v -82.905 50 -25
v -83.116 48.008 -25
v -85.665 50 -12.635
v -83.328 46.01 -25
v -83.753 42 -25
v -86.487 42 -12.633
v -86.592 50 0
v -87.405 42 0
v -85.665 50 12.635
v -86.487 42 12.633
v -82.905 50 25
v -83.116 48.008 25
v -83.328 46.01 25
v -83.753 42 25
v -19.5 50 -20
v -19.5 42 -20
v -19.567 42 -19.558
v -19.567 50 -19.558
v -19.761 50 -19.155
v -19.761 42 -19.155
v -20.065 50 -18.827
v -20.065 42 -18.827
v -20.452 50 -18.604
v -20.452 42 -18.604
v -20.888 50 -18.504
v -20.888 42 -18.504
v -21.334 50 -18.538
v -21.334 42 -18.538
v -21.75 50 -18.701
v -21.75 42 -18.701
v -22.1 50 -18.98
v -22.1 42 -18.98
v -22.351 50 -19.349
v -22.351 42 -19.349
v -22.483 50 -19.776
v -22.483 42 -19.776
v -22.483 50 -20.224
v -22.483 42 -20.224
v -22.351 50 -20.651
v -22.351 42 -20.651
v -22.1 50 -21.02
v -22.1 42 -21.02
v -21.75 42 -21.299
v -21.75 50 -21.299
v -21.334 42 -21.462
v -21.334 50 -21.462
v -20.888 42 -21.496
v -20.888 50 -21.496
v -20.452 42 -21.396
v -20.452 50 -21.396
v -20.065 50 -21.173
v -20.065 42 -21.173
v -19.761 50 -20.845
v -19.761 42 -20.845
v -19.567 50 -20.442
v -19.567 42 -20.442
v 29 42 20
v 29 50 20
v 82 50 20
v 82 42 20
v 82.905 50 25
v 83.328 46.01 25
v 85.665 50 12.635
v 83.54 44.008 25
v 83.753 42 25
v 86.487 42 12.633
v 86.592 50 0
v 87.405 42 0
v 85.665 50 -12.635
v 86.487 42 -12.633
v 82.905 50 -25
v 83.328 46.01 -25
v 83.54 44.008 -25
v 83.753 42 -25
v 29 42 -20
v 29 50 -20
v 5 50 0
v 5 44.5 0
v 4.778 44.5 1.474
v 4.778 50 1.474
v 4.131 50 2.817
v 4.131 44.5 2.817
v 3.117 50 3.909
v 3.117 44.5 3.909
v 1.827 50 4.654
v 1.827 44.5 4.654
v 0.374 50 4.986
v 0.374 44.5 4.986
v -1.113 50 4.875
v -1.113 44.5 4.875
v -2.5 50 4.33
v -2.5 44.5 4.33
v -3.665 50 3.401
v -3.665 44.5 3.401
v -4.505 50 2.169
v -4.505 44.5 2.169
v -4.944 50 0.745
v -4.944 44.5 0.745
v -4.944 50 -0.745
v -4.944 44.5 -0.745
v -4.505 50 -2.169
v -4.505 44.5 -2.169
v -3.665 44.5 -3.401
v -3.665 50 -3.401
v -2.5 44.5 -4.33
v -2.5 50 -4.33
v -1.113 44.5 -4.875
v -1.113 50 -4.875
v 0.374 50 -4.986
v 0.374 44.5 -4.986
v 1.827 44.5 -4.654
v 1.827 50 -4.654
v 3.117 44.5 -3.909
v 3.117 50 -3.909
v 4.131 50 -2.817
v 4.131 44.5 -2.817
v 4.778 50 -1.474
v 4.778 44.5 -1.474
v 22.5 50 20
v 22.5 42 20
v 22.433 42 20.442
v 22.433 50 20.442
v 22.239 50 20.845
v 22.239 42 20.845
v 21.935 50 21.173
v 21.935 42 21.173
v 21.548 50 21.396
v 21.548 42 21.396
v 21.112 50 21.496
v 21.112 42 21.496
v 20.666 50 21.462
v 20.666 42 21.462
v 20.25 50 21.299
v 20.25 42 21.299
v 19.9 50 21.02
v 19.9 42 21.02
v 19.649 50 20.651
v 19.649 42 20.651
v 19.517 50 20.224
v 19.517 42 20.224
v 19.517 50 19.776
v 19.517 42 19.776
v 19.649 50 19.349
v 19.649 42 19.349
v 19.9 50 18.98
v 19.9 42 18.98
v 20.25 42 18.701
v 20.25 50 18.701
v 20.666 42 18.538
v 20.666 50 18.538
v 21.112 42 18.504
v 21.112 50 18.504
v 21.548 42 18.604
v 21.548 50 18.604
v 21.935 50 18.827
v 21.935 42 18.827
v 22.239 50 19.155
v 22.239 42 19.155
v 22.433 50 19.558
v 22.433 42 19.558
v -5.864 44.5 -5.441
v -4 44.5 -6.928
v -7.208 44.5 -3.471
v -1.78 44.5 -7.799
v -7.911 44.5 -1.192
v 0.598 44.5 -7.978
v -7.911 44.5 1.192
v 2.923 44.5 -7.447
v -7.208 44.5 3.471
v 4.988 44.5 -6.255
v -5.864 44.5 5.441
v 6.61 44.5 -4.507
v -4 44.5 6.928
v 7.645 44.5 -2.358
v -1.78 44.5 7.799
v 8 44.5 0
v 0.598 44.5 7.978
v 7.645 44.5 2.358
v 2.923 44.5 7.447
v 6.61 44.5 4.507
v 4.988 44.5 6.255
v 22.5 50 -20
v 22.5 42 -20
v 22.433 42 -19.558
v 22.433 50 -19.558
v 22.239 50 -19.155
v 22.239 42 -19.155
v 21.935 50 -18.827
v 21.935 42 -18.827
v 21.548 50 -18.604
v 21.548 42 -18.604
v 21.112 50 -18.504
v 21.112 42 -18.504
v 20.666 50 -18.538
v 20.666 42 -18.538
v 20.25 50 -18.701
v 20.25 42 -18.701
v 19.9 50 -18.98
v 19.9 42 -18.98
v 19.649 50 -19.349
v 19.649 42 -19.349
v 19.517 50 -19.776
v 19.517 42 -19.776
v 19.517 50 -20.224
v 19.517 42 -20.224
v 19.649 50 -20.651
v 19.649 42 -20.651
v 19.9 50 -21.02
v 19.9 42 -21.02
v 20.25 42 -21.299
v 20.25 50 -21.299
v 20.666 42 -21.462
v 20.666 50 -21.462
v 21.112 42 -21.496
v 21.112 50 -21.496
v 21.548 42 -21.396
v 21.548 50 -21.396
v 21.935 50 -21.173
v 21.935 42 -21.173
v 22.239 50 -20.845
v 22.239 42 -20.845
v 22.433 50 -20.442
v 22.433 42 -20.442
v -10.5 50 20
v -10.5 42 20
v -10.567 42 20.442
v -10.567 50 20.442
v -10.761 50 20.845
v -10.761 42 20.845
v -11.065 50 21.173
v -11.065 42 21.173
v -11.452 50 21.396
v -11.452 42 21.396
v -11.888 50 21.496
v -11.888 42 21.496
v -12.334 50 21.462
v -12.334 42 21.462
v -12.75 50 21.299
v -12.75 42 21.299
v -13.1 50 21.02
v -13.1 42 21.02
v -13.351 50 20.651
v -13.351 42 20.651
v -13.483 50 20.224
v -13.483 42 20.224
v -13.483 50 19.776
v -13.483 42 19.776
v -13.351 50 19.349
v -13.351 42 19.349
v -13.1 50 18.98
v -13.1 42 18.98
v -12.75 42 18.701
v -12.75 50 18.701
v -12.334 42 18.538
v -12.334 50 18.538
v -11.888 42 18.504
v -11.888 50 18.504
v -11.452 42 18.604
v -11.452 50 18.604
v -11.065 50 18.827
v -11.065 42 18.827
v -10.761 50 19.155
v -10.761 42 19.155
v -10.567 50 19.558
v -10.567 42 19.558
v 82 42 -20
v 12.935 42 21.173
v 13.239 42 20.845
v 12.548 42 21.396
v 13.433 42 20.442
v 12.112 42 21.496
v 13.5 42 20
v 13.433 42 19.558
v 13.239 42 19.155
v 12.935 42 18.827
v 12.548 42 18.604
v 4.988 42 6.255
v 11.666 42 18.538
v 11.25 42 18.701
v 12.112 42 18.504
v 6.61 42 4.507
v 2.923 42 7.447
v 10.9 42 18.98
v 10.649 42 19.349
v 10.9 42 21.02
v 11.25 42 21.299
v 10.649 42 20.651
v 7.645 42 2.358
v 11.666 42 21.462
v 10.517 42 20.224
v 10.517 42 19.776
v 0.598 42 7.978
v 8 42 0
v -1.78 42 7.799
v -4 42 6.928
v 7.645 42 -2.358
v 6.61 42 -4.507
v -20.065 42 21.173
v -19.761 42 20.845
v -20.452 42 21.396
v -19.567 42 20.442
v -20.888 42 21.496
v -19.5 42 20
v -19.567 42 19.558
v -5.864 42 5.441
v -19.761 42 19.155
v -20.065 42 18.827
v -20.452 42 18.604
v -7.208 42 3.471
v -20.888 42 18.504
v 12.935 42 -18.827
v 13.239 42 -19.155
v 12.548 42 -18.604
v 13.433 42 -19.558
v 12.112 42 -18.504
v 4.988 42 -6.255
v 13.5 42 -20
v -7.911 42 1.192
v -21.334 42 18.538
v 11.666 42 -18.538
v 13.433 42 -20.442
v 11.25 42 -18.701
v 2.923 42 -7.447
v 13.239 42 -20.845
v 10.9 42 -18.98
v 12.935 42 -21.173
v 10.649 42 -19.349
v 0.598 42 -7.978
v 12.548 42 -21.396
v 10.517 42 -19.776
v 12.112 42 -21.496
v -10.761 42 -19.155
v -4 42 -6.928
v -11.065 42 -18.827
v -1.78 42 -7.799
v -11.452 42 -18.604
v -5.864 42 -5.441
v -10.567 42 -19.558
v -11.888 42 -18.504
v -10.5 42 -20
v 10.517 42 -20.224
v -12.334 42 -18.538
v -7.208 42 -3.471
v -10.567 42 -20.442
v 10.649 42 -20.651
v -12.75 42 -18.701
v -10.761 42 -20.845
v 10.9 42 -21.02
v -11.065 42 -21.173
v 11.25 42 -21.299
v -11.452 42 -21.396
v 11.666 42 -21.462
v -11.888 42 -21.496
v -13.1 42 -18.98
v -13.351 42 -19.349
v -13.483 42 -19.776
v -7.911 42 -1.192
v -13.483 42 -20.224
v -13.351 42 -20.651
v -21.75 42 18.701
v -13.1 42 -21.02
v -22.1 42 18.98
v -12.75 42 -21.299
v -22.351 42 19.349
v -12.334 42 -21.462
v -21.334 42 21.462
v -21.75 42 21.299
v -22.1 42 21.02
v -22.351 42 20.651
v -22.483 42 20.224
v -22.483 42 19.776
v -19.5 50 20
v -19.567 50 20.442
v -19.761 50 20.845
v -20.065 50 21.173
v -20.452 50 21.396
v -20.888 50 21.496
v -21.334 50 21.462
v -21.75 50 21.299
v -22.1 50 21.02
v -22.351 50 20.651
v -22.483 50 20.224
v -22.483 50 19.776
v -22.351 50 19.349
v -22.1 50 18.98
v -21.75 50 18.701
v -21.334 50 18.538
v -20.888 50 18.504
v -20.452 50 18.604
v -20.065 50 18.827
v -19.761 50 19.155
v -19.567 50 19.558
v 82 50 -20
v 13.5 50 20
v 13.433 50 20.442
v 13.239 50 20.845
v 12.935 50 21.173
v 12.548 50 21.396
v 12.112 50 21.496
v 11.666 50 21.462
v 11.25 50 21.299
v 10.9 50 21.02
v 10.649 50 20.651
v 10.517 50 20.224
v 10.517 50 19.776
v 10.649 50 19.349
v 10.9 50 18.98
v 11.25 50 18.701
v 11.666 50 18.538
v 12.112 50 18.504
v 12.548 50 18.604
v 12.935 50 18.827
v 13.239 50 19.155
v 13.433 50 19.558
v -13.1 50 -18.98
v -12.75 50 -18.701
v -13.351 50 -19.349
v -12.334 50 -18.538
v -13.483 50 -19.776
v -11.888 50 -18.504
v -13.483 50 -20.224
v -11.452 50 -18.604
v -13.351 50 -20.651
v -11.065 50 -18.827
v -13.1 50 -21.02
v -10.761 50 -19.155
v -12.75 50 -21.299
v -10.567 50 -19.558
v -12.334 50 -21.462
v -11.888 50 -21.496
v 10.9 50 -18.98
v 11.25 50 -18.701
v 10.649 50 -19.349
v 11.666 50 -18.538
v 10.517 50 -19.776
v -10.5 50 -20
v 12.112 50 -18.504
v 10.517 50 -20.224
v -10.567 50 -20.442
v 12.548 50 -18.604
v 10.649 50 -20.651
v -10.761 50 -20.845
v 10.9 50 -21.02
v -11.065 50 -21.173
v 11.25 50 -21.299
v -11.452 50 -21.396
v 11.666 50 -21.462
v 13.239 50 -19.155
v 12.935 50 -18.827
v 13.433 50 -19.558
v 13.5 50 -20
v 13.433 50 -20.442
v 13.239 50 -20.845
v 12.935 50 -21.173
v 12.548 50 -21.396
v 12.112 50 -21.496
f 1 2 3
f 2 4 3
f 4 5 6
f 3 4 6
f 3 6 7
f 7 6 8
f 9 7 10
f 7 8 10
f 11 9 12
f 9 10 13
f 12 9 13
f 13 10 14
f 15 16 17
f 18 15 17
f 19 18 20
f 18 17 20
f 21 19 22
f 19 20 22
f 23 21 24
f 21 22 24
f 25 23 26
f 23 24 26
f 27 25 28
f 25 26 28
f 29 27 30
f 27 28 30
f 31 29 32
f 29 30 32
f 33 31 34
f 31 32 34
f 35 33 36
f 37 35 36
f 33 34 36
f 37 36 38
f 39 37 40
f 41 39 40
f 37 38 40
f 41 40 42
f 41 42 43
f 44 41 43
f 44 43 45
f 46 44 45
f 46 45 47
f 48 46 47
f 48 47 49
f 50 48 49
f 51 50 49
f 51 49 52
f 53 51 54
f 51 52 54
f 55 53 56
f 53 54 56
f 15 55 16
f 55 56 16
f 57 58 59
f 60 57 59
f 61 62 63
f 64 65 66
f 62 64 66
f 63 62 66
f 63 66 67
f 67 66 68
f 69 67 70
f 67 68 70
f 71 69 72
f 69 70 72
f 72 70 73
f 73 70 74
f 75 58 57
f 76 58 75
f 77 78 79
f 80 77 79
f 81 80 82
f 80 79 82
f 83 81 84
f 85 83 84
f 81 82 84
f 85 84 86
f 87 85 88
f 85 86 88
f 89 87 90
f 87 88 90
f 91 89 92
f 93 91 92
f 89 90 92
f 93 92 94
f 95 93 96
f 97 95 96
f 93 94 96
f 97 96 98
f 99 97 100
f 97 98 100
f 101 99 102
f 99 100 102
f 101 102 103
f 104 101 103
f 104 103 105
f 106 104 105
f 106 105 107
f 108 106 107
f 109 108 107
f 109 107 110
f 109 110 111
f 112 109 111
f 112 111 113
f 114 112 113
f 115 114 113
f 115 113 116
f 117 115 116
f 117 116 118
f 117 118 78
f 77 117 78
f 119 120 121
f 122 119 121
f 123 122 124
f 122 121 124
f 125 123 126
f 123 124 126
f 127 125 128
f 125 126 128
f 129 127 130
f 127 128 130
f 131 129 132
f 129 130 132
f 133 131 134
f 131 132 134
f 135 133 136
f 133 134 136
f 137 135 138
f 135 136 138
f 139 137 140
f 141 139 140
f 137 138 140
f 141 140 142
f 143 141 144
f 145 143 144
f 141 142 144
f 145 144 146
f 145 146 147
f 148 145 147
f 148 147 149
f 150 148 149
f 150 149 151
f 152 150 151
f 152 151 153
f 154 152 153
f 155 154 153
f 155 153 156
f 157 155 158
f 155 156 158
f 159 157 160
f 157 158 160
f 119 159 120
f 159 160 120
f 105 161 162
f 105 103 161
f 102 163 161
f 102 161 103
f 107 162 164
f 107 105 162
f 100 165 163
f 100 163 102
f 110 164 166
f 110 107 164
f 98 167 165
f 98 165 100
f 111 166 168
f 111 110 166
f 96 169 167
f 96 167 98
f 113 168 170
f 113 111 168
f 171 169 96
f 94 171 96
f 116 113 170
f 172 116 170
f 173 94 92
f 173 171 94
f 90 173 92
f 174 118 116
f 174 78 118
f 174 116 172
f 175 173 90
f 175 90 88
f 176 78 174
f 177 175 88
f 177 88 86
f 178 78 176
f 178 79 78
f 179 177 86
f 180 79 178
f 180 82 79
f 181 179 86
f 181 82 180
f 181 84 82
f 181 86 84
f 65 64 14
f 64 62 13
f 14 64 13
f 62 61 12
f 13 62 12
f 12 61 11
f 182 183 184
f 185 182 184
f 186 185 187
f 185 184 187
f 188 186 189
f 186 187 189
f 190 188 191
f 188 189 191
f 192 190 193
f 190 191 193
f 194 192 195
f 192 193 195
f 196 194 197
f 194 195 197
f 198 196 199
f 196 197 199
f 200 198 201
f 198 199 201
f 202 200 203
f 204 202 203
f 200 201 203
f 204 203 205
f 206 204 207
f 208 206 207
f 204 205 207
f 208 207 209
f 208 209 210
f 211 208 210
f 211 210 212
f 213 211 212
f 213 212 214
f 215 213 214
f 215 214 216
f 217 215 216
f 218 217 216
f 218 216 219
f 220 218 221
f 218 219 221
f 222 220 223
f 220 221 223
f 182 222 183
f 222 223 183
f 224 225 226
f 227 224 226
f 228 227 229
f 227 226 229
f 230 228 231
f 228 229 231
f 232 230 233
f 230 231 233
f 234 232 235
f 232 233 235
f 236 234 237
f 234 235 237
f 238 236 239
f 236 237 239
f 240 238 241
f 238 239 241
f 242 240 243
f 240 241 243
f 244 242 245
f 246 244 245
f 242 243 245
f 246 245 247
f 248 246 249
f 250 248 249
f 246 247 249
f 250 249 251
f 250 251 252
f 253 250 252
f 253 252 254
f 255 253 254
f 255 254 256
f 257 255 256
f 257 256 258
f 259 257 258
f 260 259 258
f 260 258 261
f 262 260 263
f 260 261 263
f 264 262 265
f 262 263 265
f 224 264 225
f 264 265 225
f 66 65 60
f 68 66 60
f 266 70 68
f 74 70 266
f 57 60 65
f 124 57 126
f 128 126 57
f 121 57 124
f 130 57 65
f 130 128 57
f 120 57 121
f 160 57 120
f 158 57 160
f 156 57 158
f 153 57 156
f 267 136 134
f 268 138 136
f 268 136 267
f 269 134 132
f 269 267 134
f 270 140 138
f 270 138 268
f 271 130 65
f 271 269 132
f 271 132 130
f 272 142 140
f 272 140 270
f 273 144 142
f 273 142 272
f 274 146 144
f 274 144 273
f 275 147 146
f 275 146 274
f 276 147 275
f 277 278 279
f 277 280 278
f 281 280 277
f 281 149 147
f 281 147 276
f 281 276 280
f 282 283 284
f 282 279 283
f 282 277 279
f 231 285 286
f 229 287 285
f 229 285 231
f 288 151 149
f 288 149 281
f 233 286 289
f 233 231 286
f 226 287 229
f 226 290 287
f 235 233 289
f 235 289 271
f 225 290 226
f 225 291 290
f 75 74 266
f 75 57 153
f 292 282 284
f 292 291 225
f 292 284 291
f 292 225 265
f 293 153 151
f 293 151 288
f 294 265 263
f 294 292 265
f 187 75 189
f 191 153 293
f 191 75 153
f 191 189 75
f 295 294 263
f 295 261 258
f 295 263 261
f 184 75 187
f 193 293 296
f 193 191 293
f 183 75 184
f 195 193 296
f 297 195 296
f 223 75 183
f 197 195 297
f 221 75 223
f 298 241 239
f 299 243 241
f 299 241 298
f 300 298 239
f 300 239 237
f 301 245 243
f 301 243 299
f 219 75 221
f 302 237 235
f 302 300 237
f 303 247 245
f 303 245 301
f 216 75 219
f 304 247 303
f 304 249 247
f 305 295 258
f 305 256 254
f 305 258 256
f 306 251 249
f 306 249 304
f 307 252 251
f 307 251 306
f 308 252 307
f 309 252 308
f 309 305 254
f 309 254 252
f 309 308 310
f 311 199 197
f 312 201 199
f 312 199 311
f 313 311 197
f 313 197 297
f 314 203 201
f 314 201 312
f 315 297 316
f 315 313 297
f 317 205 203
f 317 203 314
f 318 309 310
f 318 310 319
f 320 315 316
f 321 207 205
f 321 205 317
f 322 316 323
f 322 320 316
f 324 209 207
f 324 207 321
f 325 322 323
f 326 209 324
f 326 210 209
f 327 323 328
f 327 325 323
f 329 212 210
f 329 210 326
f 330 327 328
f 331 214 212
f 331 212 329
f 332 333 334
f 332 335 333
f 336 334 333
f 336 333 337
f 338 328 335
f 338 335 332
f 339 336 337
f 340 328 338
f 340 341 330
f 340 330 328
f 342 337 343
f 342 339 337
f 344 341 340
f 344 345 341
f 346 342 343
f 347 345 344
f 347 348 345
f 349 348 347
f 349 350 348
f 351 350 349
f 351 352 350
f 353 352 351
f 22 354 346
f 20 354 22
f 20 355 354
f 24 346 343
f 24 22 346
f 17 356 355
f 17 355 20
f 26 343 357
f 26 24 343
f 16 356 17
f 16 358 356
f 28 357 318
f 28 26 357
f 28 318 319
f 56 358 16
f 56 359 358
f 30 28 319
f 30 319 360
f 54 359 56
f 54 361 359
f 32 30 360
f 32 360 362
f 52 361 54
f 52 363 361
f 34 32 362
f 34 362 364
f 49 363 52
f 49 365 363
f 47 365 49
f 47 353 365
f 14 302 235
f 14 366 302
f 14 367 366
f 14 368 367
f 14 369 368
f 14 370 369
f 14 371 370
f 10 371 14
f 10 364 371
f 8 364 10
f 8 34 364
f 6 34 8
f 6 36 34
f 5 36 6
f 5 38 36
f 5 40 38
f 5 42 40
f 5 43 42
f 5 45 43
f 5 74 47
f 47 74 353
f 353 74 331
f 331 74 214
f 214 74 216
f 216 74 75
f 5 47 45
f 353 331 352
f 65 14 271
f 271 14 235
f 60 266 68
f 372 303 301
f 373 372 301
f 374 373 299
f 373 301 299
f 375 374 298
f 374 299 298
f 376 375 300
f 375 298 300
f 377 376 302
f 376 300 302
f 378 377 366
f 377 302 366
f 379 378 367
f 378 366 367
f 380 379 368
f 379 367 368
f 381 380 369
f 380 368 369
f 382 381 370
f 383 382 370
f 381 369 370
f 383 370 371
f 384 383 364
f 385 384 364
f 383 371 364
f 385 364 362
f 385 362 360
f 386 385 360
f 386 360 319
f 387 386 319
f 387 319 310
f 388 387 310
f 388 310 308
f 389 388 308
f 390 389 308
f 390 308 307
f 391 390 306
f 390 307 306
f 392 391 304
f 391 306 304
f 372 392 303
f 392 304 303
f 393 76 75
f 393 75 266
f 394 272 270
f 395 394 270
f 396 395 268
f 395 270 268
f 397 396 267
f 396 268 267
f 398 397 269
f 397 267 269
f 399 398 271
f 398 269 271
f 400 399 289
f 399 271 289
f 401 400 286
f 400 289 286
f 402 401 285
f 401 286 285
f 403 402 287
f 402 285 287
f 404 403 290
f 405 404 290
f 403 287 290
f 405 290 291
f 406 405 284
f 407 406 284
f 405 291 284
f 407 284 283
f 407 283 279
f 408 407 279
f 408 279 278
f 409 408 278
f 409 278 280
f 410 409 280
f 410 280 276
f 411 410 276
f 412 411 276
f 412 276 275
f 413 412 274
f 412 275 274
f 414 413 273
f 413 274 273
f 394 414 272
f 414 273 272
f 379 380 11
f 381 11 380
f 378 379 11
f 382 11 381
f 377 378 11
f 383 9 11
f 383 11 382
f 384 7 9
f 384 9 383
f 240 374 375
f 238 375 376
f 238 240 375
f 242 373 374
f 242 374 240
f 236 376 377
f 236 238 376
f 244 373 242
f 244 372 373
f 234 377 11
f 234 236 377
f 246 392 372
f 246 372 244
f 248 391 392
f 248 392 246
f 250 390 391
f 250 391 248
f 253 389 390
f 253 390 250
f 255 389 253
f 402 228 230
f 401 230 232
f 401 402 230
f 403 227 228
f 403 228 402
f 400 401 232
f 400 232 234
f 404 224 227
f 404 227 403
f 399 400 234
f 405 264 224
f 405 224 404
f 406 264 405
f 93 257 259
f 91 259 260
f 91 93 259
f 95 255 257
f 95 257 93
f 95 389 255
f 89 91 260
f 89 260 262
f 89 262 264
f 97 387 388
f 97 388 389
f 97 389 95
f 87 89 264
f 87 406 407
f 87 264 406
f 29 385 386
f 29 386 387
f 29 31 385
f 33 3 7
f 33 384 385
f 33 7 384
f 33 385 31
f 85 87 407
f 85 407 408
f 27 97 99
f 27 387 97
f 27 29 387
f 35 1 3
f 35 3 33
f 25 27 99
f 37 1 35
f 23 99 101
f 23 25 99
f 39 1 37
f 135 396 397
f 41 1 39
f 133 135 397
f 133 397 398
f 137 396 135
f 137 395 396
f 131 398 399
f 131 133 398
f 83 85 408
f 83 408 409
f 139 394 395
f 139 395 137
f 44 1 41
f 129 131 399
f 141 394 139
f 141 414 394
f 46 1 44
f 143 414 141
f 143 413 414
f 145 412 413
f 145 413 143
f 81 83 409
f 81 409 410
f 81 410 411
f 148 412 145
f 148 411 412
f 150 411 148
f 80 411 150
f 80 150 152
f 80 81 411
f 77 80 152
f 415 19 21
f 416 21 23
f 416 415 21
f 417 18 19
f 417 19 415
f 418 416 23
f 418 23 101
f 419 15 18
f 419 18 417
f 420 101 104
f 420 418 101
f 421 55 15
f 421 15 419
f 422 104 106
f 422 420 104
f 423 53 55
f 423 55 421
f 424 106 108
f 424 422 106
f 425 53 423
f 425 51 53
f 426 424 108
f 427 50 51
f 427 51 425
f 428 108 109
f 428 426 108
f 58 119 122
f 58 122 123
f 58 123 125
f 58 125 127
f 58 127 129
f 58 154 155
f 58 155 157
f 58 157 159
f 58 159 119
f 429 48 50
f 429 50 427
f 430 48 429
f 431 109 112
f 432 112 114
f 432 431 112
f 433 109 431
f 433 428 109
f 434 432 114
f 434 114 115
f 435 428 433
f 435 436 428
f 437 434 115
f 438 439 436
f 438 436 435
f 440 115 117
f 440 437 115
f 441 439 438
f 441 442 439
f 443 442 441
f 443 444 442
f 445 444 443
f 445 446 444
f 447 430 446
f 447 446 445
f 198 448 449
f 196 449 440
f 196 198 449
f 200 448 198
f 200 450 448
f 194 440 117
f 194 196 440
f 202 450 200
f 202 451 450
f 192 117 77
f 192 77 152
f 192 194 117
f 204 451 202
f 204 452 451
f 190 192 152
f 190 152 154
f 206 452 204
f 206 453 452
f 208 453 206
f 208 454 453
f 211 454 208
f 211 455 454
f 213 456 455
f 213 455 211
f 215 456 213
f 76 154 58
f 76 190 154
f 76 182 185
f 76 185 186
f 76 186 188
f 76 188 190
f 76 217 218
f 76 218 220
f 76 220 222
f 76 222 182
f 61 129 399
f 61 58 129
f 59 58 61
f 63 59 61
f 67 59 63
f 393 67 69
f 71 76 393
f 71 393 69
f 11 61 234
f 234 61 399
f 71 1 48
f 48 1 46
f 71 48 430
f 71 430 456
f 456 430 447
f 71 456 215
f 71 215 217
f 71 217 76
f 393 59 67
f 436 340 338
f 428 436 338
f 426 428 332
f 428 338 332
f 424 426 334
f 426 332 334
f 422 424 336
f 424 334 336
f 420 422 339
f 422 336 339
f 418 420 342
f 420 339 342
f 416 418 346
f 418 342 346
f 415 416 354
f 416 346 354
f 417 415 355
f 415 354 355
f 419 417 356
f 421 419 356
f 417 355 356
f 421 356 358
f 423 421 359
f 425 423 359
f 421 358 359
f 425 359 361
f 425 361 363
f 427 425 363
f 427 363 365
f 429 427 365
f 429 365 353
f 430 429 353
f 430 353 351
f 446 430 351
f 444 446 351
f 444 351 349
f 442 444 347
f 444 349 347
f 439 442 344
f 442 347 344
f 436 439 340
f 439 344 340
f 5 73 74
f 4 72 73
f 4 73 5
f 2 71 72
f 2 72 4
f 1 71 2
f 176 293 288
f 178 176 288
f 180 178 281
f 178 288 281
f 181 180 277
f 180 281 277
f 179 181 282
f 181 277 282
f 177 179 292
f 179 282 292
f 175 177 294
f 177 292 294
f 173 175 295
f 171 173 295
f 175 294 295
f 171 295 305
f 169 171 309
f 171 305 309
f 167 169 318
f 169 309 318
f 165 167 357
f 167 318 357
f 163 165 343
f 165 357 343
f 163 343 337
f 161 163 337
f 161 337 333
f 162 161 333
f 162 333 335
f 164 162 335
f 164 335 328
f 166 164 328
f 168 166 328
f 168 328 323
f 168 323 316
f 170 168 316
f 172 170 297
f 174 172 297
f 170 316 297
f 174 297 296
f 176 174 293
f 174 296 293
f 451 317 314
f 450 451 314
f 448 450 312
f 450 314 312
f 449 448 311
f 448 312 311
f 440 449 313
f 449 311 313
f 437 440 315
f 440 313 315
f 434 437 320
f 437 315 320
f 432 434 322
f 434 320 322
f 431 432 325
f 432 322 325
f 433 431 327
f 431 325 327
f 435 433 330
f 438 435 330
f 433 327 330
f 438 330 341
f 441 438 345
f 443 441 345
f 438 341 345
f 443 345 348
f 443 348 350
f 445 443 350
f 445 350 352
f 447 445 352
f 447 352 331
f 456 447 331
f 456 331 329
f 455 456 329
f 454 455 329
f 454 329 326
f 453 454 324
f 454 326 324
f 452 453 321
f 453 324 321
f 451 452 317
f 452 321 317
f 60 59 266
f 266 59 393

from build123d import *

# Parameters (mm, degrees)
TOP_PLATE_BOSS_EXTRUDE1_DEPTH                  = 25
TOP_PLATE_BOSS_EXTRUDE1_DEPTH_BACK             = 25
SKETCH5_R                                      = 5
SHAFT_CUT_EXTRUDE1_DEPTH                       = 8
SKETCH6_R                                      = 8
SHAFT_BEARING_CUT_EXTRUDE2_DEPTH               = 2.5
SKETCH7_R                                      = 1.5
BEARING_PLATE_MOUNTING_HOLES_CUT_EXTRUDE_DEPTH = 8
SKETCH8_R                                      = 1.5
BASE_SIDE_MOUNTING_HOLES_CUT_EXTRUDE4_DEPTH    = 8
SKETCH9_W                                      = 53
SKETCH9_H                                      = 40
TIMING_BELT_SLIDER_HOLE_CUT_EXTRUDE1_DEPTH     = 8


with BuildPart() as part:
    # Sketch2 → Top Plate Boss-Extrude1 (new, two sides: drawn at the far end of the back side and taken through both)
    with BuildSketch(Plane.XY.offset(-TOP_PLATE_BOSS_EXTRUDE1_DEPTH_BACK)):
        Polygon((-86.592068141, 50), (86.592068141, 50), (87.404678508, 42), (-87.404678508, 42), align=None)
    extrude(amount=TOP_PLATE_BOSS_EXTRUDE1_DEPTH + TOP_PLATE_BOSS_EXTRUDE1_DEPTH_BACK)

    # Sketch4 → Top Plate Chassi Rounding Cut-Revolve1 (revolve, cut)
    with BuildSketch(Plane.XY):
        Polygon((86.592068141, 50), (87.404678508, 42), (97.784973569, 42), (97.784973569, 50), align=None)
    revolve(axis=Axis((0, 0, 0), (0, 1, 0)), mode=Mode.SUBTRACT)

    # Sketch5 → Shaft Cut-Extrude1 (cut)
    with BuildSketch(Plane.XZ.offset(-42)):
        Circle(SKETCH5_R)
    extrude(amount=-SHAFT_CUT_EXTRUDE1_DEPTH, mode=Mode.SUBTRACT)

    # Sketch6 → Shaft Bearing Cut-Extrude2 (cut)
    with BuildSketch(Plane.XZ.offset(-42)):
        Circle(SKETCH6_R)
    extrude(amount=-SHAFT_BEARING_CUT_EXTRUDE2_DEPTH, mode=Mode.SUBTRACT)

    # Sketch7 → Bearing Plate Mounting Holes Cut-Extrude3 (cut)
    with BuildSketch(Plane.XZ.offset(-42)):
        with Locations((12, 20)):
            Circle(SKETCH7_R)
        with Locations((-12, 20)):
            Circle(SKETCH7_R)
        with Locations((-12, -20)):
            Circle(SKETCH7_R)
        with Locations((12, -20)):
            Circle(SKETCH7_R)
    extrude(amount=-BEARING_PLATE_MOUNTING_HOLES_CUT_EXTRUDE_DEPTH, mode=Mode.SUBTRACT)

    # Sketch8 → Base Side Mounting Holes Cut-Extrude4 (cut)
    with BuildSketch(Plane.XZ.offset(-42)):
        with Locations((21, 20)):
            Circle(SKETCH8_R)
        with Locations((-21, 20)):
            Circle(SKETCH8_R)
        with Locations((-21, -20)):
            Circle(SKETCH8_R)
        with Locations((21, -20)):
            Circle(SKETCH8_R)
    extrude(amount=-BASE_SIDE_MOUNTING_HOLES_CUT_EXTRUDE4_DEPTH, mode=Mode.SUBTRACT)

    # Sketch9 → Timing Belt Slider Hole Cut-Extrude1 (cut)
    with BuildSketch(Plane(origin=(0, 50, 0), x_dir=(1, 0, 0), z_dir=(0, 1, 0))):
        with Locations((55.5, 0)):
            Rectangle(SKETCH9_W, SKETCH9_H)
    extrude(amount=-TIMING_BELT_SLIDER_HOLE_CUT_EXTRUDE1_DEPTH, mode=Mode.SUBTRACT)


solid = part.part
